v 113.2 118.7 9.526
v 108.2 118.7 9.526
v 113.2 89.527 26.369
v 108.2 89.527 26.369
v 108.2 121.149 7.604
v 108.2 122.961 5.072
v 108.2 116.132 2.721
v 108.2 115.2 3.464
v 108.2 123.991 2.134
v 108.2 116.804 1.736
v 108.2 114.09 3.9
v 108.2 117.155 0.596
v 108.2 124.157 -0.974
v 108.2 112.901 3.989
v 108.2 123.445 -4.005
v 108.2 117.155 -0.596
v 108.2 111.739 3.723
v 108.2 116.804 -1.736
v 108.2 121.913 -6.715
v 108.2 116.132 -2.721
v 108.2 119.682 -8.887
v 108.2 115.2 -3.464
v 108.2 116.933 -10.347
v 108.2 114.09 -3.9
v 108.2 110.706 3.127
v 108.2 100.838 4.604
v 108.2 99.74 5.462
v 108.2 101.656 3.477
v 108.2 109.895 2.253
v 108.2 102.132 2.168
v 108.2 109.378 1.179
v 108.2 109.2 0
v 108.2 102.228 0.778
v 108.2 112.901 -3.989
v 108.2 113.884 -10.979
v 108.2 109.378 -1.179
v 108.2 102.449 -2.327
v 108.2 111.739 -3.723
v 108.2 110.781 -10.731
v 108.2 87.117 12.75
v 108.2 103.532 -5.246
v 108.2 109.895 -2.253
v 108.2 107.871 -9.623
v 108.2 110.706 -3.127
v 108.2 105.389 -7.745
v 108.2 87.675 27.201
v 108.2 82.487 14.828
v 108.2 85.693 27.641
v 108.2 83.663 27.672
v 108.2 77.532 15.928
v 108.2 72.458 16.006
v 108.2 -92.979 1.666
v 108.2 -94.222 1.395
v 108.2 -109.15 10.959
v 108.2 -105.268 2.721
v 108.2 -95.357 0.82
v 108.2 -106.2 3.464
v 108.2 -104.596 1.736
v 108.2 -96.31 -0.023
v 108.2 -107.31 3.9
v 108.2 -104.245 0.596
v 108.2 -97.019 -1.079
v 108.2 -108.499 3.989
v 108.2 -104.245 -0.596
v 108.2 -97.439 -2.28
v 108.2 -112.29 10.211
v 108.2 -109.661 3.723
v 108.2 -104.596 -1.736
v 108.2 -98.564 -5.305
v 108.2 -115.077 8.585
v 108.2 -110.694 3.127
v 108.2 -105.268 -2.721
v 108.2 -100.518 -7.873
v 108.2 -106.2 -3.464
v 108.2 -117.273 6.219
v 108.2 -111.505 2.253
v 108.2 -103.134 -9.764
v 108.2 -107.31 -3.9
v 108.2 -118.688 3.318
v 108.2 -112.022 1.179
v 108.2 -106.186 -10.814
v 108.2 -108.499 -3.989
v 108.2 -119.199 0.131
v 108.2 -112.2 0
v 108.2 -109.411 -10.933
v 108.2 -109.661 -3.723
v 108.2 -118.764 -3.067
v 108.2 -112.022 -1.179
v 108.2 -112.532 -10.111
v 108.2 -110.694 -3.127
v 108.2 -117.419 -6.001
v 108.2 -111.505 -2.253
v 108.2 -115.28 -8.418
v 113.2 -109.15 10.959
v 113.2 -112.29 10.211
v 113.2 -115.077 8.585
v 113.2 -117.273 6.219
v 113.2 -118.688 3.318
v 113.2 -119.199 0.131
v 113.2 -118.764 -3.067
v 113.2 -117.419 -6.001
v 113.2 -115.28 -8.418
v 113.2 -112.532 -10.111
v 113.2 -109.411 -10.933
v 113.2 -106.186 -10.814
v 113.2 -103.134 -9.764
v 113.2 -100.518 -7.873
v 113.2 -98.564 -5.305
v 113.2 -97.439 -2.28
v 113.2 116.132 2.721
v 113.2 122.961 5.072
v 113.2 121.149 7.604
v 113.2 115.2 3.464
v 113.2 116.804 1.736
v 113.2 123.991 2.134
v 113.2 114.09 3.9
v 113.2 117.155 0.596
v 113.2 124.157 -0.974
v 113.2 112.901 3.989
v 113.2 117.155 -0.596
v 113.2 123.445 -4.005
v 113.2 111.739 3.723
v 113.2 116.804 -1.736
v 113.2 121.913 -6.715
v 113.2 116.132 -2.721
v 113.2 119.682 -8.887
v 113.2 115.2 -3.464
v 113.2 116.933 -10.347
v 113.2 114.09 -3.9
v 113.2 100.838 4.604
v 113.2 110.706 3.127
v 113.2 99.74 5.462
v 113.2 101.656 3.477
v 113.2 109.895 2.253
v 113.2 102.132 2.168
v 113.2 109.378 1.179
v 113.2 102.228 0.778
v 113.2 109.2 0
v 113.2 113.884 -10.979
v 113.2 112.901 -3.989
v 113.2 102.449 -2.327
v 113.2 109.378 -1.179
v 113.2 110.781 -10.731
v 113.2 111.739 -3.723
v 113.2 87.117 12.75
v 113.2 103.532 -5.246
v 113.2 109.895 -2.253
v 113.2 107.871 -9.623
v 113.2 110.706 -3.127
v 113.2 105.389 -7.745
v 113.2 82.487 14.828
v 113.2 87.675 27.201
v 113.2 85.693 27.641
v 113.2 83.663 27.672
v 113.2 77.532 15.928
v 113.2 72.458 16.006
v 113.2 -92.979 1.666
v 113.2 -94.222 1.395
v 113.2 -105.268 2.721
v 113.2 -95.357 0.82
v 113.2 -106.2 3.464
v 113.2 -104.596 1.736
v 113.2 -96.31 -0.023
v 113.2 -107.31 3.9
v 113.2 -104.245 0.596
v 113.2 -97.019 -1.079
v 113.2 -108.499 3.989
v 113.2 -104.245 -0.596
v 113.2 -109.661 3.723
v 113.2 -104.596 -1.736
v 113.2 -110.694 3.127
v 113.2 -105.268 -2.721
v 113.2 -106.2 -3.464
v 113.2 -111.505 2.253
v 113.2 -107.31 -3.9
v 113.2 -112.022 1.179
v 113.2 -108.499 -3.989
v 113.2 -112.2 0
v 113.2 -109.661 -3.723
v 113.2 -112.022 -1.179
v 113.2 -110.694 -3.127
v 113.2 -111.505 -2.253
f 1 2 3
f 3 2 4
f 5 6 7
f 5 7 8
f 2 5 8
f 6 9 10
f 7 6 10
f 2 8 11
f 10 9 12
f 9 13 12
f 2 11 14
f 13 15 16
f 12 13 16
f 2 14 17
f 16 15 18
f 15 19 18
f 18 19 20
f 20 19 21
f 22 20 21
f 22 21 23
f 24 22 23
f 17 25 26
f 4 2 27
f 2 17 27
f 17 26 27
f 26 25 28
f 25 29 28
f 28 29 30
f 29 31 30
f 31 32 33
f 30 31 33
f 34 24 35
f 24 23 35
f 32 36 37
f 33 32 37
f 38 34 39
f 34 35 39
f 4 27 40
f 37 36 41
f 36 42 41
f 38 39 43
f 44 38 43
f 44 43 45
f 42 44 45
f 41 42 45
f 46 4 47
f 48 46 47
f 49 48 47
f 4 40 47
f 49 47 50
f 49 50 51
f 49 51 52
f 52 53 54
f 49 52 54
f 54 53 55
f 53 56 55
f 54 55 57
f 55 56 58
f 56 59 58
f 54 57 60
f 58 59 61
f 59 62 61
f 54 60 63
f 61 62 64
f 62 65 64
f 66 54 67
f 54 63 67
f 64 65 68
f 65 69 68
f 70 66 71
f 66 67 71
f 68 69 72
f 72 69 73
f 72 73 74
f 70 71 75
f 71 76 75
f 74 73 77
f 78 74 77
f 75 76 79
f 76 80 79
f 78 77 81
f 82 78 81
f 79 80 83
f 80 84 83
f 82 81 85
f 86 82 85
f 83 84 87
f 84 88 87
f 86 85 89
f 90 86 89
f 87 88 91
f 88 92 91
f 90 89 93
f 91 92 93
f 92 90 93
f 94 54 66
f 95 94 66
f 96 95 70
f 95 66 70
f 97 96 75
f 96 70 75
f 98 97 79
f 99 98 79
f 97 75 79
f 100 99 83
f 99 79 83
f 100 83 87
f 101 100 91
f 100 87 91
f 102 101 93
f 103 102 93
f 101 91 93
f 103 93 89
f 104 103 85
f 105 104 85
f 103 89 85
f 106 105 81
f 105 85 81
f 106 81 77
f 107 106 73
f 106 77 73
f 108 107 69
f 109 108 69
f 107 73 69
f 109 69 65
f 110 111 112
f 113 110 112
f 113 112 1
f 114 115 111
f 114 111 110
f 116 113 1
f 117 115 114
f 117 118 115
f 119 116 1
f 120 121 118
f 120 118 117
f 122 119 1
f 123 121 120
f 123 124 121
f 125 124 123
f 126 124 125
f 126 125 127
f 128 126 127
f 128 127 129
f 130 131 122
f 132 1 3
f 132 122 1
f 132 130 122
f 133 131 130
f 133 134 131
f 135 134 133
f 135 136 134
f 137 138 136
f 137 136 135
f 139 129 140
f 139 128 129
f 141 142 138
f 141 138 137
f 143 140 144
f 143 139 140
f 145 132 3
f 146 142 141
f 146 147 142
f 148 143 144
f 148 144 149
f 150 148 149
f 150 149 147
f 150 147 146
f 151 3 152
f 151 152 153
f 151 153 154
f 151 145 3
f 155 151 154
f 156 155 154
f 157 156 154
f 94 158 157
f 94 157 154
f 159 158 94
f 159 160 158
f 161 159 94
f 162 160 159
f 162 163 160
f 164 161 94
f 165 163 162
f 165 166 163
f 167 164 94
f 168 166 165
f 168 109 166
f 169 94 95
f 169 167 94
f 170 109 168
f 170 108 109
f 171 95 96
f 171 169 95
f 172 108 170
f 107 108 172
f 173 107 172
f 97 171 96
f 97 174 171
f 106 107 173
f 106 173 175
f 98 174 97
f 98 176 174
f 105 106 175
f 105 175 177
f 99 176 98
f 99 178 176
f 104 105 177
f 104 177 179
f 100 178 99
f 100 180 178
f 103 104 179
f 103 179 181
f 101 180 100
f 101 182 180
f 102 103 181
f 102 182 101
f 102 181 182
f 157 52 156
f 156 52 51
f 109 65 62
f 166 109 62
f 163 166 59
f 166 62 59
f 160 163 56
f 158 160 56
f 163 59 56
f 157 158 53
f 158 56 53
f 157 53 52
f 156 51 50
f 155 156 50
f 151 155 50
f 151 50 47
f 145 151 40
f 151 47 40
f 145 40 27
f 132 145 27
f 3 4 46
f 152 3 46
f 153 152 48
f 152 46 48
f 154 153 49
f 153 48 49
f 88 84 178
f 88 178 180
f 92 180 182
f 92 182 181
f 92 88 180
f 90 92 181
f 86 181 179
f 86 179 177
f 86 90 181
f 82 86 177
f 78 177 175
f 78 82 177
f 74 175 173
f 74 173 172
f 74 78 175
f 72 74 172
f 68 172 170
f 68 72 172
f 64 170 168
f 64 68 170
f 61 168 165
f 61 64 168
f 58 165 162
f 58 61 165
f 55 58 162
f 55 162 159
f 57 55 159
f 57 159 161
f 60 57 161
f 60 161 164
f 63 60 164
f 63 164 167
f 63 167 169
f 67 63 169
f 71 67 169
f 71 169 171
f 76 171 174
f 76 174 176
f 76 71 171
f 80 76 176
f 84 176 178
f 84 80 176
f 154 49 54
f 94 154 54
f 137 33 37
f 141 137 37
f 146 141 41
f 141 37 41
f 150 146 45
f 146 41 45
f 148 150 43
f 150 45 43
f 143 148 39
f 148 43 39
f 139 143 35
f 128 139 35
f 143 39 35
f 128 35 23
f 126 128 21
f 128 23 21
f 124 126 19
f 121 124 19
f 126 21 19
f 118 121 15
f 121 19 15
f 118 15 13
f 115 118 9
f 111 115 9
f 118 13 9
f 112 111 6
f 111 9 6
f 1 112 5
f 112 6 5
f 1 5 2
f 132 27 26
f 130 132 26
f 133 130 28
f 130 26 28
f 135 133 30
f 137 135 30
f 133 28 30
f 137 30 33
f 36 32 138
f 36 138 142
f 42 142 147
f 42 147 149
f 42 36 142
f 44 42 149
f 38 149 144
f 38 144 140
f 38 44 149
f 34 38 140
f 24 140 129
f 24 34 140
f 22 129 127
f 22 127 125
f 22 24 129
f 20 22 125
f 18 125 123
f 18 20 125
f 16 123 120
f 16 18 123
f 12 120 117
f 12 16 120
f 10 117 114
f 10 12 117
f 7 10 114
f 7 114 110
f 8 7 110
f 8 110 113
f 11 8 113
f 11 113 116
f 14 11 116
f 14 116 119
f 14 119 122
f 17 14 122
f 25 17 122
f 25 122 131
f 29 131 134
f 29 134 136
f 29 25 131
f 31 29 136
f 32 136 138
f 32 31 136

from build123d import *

# Parameters (mm, degrees)
SKETCH1_R             = 4
SKETCH1_R_2           = 3.999999999
BOSS_EXTRUDE1_DEPTH   = 5
BODY_MOVE_COPY1_ANGLE = 90


with BuildPart() as part:
    # Sketch1 → Boss-Extrude1 (new body)
    with BuildSketch(Plane(origin=(0, 0, 0), x_dir=(1, 0, 0), z_dir=(0, 1, 0))):
        with BuildLine():
            Line((-5.5, -9.526279442), (23.673254908, -26.369466016))
            ThreePointArc((23.673254908, -26.369466016), (26.504938869, -27.471302202), (29.53681211, -27.671855651))
            Line((29.53681211, -27.671855651), (222.349912922, -10.958908038))
            ThreePointArc((222.349912922, -10.958908038), (229.638892539, 7.288391438), (210.63878065, 2.279508305))
            ThreePointArc((210.63878065, 2.279508305), (209.060222507, -0.429302712), (206.17909591, -1.665673394))
            Line((206.17909591, -1.665673394), (40.742030274, -16.005679335))
            ThreePointArc((40.742030274, -16.005679335), (33.162347172, -15.504295714), (26.08313727, -12.749705247))
            Line((26.08313727, -12.749705247), (13.459935794, -5.461696477))
            ThreePointArc((13.459935794, -5.461696477), (11.544061041, -3.476788033), (10.972455859, -0.777954003))
            ThreePointArc((10.972455859, -0.777954003), (-5.159480863, 9.714924458), (-5.5, -9.526279442))
        make_face()
        Circle(SKETCH1_R, mode=Mode.SUBTRACT)
        with Locations((221.4, 2e-09)):
            Circle(SKETCH1_R_2, mode=Mode.SUBTRACT)
    extrude(amount=BOSS_EXTRUDE1_DEPTH)


with BuildPart() as part_1:
    # Body-Move/Copy1: moved
    add(part.part.rotate(Axis((110.7, 2.5, 0), (0, 0, -1)), BODY_MOVE_COPY1_ANGLE))


solid = part_1.part
